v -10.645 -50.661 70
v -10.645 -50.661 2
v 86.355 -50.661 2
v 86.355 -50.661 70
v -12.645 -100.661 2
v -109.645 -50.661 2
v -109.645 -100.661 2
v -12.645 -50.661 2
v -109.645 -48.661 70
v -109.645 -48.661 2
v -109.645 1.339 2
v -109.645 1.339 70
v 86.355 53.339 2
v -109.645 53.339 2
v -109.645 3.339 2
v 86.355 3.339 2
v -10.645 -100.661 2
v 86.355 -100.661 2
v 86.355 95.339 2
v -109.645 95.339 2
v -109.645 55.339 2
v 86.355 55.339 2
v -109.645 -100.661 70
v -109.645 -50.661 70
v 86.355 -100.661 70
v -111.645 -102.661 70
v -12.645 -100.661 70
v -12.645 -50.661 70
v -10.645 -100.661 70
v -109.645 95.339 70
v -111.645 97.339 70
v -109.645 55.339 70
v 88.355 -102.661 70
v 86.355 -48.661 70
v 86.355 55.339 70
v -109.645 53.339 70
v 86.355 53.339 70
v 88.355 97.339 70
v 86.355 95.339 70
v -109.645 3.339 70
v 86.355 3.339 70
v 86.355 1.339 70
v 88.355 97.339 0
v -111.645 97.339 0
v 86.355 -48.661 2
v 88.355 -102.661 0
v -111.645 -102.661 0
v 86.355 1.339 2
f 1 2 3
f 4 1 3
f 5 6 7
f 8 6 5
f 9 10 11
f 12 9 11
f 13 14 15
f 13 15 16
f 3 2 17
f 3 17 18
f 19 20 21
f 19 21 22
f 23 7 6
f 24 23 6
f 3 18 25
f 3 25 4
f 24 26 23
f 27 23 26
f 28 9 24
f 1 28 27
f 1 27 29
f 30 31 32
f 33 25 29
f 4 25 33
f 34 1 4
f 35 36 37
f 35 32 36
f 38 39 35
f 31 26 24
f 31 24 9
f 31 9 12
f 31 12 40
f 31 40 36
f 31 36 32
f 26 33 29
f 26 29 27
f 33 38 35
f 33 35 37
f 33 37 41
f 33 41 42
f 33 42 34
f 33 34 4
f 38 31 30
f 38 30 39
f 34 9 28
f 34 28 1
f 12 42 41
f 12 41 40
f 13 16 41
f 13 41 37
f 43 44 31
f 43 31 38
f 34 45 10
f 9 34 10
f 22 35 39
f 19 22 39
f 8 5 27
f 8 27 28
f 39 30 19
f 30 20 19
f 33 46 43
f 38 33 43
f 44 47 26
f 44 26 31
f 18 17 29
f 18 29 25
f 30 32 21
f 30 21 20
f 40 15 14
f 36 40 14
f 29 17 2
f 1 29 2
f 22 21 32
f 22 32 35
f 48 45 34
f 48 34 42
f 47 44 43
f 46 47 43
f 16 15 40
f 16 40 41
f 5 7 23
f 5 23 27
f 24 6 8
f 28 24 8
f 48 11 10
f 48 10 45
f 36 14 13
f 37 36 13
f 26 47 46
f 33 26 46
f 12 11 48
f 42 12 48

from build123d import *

# Parameters (mm, degrees)
F0_W     = 200
F0_H     = 200
F1_DEPTH = 70
F2_T     = -2
F3_W     = 196
F3_H     = 2
F3_W_2   = 2
F3_H_2   = 50
F4_DEPTH = 68


with BuildPart() as f1:
    # F0 (on Top) → F1 (new body)
    with BuildSketch(Plane.XY):
        with Locations((-11.6452798247, -2.6608344432)):
            Rectangle(F0_W, F0_H)
    extrude(amount=F1_DEPTH)

    # F2
    f2_openings = [f1.faces().sort_by_distance(p)[0] for p in [
        (-11.64528, -2.660834, 70),
    ]]
    offset(amount=F2_T, openings=f2_openings)

    # F3 (on face) → F4 (join)
    with BuildSketch(Plane.XY.offset(2)):
        with Locations((-11.6452798247, 54.3391655568)):
            Rectangle(F3_W, F3_H)
        with Locations((-11.6452798247, 2.3391655568)):
            Rectangle(F3_W, F3_H)
        Polygon((86.3547201753, -48.6608344432), (-109.6452798247, -48.6608344432), (-109.6452798247, -50.6608344432), (-12.6452798247, -50.6608344432), (-10.6452798247, -50.6608344432), (86.3547201753, -50.6608344432), align=None)
        with Locations((-11.6452798247, -75.6608344432)):
            Rectangle(F3_W_2, F3_H_2)
    extrude(amount=F4_DEPTH)


solid = f1.part
